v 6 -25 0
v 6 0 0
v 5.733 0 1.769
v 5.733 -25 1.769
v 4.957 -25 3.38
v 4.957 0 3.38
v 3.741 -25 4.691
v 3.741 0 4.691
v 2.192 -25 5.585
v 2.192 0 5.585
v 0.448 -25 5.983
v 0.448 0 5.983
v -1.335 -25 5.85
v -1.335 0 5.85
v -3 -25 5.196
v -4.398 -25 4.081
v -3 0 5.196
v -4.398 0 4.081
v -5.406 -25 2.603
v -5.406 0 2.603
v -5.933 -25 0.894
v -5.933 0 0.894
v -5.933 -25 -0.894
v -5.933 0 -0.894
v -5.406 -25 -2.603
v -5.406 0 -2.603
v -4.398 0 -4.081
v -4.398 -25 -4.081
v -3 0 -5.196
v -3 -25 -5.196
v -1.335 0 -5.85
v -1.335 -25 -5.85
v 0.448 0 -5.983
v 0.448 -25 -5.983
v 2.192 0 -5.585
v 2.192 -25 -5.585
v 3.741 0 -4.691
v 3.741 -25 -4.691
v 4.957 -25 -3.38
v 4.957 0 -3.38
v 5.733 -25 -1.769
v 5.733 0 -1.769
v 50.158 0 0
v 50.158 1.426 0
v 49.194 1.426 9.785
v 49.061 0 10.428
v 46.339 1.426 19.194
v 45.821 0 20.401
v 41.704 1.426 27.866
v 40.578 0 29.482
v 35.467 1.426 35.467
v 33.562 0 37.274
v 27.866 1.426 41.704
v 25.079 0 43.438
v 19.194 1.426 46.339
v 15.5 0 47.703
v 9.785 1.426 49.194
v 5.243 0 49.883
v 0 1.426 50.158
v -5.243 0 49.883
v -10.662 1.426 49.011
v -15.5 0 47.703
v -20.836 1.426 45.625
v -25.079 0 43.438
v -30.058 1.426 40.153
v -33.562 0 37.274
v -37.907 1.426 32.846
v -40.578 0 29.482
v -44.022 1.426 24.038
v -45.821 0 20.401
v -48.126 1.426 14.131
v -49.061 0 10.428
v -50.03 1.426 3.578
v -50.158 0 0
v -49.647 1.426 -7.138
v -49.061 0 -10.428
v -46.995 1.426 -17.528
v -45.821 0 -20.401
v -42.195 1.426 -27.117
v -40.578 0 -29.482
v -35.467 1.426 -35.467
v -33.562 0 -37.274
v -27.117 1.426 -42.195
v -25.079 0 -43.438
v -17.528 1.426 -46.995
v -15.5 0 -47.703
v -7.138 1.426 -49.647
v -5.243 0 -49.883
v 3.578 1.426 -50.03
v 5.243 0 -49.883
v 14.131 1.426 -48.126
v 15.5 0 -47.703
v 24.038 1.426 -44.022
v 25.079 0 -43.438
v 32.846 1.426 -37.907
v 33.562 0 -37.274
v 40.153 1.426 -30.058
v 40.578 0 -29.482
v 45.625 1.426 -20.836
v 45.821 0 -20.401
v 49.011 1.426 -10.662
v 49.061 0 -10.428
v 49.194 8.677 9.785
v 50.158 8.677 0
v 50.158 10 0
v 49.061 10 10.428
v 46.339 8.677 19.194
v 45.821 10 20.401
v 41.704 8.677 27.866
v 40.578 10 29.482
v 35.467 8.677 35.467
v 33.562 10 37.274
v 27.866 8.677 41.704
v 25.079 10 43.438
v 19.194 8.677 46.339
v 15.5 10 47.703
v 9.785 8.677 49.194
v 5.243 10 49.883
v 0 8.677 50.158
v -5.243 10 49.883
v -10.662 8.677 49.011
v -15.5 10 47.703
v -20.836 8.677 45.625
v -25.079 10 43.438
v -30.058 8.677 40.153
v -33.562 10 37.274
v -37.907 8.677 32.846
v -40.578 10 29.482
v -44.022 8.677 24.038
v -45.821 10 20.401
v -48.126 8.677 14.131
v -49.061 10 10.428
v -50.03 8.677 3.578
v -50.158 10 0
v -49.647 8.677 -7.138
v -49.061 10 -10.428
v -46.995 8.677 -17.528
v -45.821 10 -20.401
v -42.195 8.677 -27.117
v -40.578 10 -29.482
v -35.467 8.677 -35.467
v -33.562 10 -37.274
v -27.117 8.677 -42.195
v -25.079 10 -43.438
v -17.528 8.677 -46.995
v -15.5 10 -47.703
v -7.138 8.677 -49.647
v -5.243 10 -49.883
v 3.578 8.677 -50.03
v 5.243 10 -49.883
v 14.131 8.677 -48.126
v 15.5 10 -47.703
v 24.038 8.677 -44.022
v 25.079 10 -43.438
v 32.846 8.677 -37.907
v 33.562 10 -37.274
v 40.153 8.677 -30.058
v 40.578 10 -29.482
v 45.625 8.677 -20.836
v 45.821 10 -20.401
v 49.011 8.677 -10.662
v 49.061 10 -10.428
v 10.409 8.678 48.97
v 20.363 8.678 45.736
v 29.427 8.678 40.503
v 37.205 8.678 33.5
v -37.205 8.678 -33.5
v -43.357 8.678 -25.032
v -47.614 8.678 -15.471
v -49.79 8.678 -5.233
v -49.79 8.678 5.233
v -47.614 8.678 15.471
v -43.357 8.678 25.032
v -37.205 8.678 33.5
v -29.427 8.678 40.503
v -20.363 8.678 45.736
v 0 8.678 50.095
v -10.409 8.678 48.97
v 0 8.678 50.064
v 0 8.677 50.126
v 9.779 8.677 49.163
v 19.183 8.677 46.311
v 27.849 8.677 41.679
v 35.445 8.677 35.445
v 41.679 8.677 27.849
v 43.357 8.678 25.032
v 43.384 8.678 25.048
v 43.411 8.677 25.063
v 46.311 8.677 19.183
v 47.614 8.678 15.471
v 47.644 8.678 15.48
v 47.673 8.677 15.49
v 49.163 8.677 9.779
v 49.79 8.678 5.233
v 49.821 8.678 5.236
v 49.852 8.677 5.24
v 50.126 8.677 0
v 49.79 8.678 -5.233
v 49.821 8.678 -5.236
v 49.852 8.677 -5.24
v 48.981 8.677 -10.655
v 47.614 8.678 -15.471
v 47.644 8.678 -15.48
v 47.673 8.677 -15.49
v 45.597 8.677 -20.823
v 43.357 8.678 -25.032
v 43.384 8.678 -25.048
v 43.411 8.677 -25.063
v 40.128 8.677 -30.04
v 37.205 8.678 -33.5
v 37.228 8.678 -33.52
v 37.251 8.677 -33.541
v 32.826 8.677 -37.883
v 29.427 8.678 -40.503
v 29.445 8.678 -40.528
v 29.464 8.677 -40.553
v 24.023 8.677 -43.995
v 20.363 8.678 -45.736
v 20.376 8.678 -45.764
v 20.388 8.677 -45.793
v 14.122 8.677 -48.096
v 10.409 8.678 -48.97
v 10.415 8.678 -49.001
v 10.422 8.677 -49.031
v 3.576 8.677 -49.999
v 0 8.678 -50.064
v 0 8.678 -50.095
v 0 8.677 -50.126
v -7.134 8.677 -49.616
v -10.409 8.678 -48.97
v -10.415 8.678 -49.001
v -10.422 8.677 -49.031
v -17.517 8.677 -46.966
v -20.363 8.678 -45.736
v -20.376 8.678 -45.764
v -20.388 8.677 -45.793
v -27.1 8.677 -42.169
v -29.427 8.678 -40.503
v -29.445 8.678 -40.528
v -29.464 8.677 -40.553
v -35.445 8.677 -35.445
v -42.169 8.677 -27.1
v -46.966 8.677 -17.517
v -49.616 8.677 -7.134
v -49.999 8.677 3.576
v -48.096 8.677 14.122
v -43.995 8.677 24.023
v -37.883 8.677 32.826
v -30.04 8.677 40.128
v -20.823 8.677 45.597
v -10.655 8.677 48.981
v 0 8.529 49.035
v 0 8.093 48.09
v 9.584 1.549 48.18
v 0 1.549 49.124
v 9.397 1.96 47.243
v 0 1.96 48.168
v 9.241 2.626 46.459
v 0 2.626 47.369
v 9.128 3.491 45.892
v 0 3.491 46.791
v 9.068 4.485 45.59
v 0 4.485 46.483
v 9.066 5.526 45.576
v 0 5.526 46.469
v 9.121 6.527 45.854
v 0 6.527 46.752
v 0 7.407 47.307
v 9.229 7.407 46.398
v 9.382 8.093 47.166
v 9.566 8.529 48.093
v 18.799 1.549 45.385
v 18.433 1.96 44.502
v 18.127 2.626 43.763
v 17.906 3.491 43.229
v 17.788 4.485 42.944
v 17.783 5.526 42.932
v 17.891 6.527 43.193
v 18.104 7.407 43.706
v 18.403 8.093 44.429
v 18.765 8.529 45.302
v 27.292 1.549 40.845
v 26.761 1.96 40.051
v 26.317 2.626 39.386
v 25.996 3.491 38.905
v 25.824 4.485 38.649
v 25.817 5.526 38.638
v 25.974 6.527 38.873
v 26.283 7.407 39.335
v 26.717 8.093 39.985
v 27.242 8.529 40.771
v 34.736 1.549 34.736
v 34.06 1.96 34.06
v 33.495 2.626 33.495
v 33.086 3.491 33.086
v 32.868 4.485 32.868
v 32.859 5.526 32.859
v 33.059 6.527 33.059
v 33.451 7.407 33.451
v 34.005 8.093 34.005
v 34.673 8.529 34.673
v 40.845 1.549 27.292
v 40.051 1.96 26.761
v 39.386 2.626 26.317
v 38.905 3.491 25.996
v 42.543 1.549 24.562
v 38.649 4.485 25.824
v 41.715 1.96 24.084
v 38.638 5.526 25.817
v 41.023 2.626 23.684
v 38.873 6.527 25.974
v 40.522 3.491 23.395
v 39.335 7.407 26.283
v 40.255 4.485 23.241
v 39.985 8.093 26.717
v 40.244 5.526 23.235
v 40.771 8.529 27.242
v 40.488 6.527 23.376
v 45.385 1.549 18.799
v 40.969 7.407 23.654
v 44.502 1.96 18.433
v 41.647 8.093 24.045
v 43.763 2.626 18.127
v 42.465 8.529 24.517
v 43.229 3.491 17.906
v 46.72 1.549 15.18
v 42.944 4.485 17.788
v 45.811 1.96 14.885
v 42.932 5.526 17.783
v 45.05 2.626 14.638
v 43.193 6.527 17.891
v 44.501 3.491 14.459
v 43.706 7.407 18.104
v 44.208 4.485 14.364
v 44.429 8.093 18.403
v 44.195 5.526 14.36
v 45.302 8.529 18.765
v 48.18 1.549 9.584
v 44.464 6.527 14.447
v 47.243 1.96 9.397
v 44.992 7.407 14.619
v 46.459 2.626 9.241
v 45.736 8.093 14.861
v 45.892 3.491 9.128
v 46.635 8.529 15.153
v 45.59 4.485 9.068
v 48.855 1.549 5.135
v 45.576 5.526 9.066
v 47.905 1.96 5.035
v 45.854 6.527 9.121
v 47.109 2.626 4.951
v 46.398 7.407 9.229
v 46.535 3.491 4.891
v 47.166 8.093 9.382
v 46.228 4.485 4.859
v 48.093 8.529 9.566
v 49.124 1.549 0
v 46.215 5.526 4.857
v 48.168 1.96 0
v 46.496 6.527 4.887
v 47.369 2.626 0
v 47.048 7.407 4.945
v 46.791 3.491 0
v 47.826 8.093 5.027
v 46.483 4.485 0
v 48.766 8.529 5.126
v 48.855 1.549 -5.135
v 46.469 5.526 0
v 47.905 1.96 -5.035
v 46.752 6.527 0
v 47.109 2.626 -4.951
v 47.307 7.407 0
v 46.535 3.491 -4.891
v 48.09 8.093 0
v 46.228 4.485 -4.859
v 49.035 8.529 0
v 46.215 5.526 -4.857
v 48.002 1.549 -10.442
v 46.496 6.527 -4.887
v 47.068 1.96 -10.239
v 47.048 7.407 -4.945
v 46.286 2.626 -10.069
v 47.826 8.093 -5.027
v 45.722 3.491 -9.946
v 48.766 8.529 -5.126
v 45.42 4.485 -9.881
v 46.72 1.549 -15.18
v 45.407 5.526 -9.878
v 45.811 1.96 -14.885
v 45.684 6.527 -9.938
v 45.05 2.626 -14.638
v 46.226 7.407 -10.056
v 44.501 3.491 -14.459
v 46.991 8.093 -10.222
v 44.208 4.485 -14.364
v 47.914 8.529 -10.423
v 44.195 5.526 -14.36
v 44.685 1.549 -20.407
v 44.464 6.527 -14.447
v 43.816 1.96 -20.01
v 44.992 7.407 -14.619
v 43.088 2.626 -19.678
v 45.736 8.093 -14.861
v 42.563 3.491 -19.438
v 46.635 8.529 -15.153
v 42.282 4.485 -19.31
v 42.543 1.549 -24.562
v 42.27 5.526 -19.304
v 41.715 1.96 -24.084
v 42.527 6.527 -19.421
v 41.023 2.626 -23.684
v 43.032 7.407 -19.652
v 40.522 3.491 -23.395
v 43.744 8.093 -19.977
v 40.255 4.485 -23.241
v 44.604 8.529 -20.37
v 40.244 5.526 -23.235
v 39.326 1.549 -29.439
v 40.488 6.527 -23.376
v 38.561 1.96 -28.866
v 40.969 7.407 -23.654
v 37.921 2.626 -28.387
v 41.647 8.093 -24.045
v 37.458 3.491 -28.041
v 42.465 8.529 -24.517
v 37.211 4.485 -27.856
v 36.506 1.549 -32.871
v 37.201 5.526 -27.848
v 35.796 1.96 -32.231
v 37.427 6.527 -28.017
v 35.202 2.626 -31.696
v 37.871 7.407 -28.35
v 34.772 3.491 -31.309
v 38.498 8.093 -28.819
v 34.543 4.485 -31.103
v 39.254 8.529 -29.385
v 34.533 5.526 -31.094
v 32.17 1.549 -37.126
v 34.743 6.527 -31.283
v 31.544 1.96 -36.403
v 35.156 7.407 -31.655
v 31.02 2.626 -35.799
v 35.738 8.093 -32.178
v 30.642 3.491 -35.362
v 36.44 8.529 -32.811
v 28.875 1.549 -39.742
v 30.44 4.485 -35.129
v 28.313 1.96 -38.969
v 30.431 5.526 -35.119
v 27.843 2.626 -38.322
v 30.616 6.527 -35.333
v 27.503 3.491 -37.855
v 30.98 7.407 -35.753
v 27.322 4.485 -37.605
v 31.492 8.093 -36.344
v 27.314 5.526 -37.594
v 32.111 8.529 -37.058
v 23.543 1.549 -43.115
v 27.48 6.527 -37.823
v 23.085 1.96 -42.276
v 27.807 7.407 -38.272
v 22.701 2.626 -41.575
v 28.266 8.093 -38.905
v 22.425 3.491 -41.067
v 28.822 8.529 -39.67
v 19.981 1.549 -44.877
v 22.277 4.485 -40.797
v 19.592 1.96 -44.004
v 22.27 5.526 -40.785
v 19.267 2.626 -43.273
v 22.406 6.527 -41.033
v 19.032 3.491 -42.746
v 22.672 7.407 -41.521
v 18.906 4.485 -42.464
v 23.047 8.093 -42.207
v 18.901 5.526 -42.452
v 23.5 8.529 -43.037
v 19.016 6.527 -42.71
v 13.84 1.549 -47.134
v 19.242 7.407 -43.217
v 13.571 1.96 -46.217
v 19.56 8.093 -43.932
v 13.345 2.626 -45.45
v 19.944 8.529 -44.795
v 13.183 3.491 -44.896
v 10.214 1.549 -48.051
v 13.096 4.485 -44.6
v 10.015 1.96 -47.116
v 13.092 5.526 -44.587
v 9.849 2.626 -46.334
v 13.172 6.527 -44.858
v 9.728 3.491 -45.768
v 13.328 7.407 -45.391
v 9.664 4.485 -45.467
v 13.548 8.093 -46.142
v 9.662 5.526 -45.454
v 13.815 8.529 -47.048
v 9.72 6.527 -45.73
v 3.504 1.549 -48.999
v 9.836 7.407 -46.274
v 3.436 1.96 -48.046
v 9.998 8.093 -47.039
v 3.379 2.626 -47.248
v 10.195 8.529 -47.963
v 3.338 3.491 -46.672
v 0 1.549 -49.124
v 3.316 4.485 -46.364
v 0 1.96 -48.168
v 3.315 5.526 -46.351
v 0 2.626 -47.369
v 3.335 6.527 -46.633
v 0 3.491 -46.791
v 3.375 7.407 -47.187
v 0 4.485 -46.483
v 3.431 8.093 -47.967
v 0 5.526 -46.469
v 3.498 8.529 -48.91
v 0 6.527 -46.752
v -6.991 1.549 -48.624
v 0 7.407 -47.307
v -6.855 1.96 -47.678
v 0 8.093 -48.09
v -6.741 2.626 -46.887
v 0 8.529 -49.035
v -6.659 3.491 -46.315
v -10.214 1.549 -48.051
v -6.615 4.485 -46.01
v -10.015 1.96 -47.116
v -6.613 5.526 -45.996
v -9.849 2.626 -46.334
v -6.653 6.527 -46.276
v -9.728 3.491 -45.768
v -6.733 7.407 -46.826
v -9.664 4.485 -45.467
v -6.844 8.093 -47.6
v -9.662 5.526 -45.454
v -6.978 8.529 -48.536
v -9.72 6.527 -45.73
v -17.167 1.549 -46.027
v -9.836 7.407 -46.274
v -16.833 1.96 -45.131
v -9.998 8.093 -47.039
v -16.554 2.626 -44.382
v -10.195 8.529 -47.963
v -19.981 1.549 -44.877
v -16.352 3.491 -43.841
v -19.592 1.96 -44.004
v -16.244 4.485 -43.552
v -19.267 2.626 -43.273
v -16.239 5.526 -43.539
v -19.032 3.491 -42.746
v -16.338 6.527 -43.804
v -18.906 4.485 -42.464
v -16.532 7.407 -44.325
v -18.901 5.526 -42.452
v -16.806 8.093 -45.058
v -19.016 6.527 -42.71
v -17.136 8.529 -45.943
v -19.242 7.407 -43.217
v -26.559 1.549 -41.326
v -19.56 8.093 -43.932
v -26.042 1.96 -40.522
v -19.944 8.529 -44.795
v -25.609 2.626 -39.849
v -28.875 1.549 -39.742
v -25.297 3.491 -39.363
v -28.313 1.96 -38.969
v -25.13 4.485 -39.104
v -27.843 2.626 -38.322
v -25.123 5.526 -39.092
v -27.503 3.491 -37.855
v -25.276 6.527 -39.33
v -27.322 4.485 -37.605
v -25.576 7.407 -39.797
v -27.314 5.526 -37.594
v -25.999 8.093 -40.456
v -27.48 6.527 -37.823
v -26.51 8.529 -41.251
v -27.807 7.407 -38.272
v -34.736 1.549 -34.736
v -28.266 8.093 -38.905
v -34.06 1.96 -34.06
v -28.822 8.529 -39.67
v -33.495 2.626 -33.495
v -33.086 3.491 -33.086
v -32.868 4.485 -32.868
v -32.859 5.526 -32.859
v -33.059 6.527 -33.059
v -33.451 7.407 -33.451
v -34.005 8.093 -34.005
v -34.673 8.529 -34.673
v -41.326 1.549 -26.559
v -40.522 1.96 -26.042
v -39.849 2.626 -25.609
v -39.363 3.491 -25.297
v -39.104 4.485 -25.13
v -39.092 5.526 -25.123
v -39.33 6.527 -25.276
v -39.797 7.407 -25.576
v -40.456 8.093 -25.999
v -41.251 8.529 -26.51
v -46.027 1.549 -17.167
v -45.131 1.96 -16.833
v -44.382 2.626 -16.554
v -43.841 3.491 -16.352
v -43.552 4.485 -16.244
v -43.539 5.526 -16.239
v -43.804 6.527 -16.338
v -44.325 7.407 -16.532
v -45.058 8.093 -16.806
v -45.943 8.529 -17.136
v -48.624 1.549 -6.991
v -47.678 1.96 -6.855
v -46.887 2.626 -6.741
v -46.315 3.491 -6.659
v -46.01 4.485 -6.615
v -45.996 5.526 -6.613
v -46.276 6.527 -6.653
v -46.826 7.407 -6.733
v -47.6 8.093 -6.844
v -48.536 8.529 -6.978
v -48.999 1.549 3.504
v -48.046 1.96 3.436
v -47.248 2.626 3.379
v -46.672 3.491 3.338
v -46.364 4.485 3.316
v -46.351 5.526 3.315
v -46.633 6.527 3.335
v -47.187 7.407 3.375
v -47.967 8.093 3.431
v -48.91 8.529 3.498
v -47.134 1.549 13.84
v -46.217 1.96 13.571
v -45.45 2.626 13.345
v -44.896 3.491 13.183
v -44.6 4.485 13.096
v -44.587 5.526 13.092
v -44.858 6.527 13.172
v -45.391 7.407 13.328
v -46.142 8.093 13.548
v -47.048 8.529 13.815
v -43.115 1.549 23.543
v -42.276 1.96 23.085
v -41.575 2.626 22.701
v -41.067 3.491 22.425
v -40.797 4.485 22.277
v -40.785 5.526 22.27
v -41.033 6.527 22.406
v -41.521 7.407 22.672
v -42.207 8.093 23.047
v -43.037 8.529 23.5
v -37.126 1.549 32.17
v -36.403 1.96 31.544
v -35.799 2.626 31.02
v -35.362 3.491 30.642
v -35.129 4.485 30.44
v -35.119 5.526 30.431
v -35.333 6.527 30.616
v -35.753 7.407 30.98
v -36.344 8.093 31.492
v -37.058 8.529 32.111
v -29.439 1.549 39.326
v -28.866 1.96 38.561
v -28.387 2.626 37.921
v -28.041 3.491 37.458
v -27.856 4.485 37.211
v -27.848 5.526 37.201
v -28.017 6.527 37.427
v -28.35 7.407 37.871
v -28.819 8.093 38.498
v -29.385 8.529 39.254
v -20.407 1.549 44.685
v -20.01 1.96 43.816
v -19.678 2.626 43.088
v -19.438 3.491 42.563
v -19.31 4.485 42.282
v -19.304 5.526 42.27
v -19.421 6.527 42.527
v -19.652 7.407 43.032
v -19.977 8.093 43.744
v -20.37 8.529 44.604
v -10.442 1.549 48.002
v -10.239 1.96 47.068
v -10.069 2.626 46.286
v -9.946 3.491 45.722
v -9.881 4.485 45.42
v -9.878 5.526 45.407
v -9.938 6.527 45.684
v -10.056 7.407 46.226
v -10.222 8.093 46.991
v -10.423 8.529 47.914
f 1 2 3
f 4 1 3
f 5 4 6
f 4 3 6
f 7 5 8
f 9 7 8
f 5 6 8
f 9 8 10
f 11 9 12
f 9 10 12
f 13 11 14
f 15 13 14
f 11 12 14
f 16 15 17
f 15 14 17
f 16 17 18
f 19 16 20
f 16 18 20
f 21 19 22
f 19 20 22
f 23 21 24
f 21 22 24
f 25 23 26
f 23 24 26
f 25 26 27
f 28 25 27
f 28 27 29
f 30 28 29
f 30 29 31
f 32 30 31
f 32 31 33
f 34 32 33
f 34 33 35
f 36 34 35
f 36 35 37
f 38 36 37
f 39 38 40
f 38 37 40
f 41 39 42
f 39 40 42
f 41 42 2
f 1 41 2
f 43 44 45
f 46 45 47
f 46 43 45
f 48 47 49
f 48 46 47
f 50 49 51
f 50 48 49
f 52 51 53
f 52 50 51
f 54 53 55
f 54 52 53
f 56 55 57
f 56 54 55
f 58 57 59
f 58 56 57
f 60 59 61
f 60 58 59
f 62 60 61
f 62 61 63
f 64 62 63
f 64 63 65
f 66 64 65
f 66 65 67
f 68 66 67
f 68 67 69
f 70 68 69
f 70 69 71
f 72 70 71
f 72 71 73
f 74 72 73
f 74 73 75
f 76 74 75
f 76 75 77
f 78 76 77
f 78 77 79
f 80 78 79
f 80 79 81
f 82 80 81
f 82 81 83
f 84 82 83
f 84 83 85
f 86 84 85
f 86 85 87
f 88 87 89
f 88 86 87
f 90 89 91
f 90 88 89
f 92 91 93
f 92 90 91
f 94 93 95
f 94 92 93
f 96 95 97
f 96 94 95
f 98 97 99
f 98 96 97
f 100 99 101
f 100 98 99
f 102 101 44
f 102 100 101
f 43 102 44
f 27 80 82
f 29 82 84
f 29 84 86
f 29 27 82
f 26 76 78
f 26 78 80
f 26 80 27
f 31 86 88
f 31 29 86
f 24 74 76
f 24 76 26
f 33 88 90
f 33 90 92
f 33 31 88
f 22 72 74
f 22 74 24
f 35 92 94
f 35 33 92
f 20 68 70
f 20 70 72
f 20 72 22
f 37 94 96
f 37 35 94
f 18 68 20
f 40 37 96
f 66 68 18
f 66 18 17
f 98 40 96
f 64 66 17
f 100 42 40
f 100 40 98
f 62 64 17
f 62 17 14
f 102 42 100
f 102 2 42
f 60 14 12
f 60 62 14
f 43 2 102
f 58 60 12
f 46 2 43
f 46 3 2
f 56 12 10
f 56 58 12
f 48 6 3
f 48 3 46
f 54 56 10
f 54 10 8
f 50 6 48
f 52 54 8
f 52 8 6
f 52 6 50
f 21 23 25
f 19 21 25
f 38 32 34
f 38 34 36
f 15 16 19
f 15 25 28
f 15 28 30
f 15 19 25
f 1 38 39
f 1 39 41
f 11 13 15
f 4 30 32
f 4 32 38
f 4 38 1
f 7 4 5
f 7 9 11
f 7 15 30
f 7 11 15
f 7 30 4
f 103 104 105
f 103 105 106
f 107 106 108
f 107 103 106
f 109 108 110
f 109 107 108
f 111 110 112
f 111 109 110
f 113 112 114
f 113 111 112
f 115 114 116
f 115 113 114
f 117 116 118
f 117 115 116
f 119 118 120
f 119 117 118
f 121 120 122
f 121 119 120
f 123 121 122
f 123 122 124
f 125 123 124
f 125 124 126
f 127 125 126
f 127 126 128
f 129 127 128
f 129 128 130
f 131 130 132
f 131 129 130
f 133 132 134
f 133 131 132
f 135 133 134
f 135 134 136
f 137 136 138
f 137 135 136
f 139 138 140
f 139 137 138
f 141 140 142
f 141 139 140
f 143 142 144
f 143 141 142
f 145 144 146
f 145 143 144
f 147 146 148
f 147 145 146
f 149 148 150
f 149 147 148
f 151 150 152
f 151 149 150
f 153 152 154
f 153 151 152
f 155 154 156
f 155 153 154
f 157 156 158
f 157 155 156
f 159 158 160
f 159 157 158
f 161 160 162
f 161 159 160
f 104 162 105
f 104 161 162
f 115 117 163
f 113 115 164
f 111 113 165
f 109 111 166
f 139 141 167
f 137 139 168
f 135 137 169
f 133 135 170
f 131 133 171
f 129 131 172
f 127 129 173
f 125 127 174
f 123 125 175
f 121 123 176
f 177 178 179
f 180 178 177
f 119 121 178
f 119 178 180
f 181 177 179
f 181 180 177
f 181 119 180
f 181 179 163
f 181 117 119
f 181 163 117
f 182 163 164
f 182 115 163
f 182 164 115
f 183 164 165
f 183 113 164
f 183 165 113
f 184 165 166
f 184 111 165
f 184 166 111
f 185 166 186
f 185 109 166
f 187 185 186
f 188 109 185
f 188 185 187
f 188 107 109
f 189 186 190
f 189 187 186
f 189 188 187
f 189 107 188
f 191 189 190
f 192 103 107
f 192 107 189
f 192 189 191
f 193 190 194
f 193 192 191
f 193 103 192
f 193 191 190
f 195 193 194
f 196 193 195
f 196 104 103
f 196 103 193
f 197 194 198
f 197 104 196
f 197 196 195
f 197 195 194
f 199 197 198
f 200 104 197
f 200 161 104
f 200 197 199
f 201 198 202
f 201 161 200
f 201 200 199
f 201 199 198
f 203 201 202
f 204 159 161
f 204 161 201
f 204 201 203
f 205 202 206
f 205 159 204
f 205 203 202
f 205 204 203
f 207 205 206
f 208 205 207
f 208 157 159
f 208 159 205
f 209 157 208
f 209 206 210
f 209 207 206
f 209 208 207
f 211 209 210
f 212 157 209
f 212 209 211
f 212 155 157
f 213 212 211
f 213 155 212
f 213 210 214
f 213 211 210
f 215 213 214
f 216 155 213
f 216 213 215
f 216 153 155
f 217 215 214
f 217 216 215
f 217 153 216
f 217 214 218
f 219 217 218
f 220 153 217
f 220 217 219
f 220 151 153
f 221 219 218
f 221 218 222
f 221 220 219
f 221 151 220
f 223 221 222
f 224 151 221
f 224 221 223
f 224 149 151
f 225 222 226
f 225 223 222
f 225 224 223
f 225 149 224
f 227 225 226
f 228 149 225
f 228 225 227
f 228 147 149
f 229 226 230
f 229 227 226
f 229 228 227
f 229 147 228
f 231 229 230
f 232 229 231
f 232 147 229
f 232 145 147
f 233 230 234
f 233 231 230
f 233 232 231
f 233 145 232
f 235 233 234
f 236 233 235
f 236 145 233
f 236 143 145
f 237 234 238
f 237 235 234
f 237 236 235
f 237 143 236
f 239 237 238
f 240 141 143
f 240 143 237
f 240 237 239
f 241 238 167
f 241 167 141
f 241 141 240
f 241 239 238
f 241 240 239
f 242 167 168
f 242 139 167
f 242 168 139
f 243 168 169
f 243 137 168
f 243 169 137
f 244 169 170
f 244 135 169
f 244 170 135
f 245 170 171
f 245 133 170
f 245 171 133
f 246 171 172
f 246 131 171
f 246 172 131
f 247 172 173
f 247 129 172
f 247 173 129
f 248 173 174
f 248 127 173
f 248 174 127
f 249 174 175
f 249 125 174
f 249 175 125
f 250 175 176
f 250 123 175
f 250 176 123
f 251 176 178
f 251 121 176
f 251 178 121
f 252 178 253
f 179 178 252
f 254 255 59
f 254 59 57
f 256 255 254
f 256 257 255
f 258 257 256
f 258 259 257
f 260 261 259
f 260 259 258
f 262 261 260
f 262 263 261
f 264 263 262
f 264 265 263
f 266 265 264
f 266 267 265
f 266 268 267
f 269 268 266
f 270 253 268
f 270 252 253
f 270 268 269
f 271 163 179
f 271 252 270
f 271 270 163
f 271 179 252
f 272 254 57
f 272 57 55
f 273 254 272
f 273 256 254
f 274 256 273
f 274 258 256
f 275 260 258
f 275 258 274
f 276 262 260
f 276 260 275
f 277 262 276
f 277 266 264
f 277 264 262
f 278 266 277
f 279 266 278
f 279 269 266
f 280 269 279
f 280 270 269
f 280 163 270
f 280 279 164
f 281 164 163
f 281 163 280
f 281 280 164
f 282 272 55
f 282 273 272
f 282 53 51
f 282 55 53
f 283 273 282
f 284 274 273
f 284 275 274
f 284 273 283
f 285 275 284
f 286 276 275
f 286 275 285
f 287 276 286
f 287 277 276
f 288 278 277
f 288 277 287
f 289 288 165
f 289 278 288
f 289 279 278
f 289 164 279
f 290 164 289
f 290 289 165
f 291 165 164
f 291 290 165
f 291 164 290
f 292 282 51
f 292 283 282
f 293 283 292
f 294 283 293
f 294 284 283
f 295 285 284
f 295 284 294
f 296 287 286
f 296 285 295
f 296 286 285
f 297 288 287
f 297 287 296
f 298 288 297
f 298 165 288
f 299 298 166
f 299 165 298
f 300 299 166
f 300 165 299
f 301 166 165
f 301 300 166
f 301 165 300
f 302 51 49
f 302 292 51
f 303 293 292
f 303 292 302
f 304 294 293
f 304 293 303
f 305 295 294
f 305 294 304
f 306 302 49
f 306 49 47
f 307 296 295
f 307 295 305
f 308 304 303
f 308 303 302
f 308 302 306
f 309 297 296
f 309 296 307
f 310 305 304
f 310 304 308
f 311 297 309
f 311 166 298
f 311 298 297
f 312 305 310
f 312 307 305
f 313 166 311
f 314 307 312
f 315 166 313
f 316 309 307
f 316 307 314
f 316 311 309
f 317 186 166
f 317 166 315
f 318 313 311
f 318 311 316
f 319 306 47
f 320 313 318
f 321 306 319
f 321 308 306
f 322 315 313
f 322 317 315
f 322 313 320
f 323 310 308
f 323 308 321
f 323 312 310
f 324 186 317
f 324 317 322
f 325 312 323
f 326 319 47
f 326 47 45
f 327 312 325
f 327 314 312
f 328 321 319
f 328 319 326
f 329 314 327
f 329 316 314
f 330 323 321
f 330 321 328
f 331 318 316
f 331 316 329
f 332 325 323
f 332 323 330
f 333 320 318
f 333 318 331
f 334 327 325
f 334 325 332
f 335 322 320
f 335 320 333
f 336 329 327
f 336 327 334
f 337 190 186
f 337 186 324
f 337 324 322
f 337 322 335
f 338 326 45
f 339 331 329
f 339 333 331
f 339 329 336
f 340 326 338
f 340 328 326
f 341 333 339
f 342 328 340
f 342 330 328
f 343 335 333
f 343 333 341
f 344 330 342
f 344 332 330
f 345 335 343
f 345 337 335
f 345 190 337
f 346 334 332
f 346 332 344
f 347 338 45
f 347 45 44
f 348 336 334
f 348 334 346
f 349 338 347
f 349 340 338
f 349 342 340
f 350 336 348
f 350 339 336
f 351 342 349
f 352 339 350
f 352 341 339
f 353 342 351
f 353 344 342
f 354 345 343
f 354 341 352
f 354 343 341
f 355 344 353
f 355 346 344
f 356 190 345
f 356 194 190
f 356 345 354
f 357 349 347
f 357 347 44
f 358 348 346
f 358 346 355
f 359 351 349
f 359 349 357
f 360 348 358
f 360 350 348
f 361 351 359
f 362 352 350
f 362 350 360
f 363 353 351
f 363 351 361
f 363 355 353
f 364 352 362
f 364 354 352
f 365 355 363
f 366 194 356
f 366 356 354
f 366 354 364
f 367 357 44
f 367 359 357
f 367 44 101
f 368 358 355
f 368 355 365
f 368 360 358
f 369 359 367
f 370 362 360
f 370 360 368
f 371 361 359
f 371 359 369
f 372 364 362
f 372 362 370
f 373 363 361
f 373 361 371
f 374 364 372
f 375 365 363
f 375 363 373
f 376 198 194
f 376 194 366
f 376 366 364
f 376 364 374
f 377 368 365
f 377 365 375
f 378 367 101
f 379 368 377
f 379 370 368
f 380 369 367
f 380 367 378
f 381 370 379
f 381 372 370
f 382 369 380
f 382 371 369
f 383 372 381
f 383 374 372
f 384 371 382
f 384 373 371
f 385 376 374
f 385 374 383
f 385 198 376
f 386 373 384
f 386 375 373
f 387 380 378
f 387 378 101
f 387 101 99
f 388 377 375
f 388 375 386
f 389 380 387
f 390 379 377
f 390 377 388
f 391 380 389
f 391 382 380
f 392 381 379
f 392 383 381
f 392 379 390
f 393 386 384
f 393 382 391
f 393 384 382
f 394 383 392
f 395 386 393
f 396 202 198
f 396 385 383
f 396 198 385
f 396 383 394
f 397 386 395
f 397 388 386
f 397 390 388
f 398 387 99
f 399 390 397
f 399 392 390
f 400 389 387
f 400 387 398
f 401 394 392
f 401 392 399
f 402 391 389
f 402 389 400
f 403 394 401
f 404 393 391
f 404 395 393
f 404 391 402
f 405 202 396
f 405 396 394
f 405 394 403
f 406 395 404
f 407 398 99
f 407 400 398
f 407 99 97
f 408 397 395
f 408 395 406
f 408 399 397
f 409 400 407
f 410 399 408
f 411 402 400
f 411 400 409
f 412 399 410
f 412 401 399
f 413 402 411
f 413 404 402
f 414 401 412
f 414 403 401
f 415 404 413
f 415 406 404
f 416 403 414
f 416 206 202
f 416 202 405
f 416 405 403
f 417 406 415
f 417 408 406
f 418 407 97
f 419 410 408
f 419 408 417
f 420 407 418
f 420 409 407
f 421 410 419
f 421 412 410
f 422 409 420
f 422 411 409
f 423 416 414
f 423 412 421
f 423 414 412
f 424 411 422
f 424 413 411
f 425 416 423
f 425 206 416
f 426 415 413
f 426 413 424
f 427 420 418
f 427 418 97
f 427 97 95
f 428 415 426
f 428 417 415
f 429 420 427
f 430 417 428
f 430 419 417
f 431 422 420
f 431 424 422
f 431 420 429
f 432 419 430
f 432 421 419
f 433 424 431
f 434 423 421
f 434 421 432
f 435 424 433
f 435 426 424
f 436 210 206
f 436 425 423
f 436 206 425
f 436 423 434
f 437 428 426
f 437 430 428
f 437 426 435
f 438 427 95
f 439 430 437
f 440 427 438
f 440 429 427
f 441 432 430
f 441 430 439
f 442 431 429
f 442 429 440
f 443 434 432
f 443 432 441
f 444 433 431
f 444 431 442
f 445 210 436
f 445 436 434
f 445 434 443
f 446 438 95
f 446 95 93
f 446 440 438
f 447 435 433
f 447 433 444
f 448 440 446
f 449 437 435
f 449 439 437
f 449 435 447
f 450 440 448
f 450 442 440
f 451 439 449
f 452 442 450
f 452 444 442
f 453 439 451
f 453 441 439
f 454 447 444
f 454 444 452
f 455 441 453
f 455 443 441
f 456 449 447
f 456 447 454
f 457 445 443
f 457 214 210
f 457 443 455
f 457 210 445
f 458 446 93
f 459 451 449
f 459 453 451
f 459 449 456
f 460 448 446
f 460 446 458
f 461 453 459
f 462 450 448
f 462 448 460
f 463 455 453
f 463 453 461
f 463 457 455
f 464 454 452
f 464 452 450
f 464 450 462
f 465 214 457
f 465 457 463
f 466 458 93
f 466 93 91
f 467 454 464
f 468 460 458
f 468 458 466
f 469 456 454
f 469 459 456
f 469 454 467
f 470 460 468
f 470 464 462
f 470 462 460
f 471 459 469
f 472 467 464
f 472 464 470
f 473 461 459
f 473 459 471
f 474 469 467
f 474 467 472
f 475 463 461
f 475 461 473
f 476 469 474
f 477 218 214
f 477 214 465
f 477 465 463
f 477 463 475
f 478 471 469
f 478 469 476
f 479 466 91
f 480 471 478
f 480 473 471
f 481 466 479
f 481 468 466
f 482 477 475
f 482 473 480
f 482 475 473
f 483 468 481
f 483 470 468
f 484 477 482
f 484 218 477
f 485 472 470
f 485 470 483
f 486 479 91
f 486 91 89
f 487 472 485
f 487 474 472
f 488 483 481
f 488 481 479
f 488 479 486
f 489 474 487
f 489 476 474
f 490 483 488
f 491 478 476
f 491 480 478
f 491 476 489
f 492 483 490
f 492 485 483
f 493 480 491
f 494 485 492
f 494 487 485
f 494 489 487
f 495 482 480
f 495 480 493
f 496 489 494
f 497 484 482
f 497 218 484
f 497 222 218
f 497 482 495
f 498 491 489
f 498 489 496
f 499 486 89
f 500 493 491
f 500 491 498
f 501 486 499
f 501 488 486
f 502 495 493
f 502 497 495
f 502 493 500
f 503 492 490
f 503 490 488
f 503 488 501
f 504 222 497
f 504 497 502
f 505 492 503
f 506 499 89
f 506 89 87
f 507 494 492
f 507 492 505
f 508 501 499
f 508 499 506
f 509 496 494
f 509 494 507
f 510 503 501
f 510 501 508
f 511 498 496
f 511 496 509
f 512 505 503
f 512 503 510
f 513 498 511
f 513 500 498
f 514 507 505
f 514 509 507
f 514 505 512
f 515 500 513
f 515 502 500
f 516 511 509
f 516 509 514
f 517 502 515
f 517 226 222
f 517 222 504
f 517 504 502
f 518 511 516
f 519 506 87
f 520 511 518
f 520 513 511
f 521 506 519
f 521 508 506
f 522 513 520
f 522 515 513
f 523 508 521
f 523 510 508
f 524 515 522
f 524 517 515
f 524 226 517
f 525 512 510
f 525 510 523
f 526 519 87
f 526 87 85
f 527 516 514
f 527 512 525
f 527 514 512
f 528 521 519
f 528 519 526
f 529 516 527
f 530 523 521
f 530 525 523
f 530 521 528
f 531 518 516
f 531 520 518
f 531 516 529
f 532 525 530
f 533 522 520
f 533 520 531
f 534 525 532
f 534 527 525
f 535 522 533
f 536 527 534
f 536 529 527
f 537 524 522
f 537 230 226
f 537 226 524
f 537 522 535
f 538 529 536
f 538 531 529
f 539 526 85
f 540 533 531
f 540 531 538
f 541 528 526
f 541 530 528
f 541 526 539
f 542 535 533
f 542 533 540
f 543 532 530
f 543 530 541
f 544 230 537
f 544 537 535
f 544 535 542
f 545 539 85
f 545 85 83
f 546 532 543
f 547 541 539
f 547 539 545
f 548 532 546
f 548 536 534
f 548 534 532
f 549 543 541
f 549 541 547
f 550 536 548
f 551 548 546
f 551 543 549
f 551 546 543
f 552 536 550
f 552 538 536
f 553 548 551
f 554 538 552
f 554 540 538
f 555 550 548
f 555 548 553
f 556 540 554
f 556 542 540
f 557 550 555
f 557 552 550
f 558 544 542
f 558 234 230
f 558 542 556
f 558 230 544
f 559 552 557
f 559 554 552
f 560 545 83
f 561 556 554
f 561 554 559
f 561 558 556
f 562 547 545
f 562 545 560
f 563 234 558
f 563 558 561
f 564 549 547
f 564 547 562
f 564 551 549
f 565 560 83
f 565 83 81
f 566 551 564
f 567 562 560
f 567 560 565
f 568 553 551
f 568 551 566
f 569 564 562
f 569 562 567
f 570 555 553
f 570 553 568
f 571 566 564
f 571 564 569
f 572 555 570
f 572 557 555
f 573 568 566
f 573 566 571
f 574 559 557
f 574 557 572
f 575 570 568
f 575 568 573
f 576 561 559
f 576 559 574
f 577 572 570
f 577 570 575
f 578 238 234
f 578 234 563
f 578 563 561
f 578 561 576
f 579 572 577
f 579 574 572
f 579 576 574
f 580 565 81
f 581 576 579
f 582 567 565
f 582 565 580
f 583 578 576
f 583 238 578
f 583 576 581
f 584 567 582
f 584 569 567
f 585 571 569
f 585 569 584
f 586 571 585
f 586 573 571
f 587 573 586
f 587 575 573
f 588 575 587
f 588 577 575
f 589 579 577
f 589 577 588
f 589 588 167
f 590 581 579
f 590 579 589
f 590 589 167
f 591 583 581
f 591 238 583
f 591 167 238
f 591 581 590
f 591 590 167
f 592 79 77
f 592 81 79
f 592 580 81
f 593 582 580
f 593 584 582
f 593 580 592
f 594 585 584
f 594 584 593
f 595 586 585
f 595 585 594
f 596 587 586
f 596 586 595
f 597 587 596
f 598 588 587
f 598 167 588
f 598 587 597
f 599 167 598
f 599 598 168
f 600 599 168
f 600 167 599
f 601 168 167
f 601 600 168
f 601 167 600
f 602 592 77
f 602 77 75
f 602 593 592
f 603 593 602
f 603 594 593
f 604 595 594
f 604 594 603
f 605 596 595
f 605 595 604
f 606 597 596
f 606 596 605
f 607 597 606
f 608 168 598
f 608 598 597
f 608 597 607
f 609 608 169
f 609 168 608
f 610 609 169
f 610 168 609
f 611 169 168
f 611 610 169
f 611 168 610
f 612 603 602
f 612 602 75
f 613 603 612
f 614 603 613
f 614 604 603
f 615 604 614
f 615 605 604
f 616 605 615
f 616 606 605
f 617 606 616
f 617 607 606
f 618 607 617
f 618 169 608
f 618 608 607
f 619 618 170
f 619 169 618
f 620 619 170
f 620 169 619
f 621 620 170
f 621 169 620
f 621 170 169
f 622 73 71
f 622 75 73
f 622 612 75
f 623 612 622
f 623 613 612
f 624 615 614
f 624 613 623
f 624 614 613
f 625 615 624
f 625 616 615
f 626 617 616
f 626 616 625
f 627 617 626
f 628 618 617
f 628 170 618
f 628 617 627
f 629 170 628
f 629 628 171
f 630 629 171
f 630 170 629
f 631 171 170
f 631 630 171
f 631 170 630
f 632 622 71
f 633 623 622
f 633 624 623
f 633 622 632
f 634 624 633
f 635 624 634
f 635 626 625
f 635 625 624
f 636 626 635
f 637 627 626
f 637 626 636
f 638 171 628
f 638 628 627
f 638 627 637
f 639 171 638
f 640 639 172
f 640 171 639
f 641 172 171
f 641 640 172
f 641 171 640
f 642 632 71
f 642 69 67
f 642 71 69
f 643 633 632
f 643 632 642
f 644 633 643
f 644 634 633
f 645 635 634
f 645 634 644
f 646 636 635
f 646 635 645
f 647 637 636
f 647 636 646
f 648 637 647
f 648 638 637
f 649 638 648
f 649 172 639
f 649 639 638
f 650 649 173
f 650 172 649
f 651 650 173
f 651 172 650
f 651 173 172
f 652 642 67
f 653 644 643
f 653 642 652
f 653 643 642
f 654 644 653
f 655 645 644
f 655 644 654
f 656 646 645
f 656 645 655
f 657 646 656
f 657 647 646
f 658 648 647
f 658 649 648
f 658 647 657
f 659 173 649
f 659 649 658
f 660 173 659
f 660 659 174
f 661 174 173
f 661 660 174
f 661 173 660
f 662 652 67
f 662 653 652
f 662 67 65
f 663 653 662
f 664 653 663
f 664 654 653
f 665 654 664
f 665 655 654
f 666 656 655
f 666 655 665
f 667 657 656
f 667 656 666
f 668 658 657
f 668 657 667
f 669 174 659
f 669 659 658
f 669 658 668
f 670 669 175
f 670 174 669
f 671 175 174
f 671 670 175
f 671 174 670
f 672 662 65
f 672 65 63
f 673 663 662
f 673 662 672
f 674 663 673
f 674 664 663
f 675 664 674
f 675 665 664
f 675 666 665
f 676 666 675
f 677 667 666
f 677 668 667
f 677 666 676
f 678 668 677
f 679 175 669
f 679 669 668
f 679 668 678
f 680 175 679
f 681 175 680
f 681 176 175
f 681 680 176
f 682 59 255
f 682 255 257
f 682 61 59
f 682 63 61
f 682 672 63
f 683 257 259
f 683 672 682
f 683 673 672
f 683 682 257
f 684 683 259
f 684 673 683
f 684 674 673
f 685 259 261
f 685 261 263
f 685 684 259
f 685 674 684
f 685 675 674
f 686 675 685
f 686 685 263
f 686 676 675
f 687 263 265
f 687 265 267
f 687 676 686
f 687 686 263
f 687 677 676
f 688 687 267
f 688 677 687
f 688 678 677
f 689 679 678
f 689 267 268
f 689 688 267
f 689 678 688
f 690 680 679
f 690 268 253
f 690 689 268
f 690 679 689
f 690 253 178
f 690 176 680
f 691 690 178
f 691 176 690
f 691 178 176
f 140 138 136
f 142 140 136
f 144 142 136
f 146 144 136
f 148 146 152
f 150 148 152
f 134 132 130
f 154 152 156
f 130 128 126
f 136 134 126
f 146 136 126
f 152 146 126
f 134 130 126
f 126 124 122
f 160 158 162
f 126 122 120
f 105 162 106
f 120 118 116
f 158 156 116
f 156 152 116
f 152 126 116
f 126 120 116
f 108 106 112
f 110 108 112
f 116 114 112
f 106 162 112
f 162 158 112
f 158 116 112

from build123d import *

# Parameters (mm, degrees)
F0_R     = 50.157501
F1_DEPTH = 10
F2_R     = 3.626246
F4_R     = 6
F5_DEPTH = 25
F6_R     = 3.797047
F7_DEPTH = 100


with BuildPart() as f1:
    # F0 (on Front) → F1 (new body)
    with BuildSketch(Plane.XZ):
        Circle(F0_R)
    extrude(amount=-F1_DEPTH)

    # F2 (on Right) → F3 (revolve, cut)
    with BuildSketch(Plane.YZ):
        with Locations((5.051546, 50.064437)):
            Circle(F2_R)
    revolve(axis=Axis((0, -2.255155, 0), (0, 1, 0)), mode=Mode.SUBTRACT)

    # F4 (on face) → F5 (join)
    with BuildSketch(Plane.XZ):
        Circle(F4_R)
    extrude(amount=F5_DEPTH)


with BuildPart() as f7:
    # F6 (on Right) → F7 (new body, symmetric)
    with BuildSketch(Plane.YZ):
        with Locations((0, 74.842192)):
            Circle(F6_R)
    extrude(amount=F7_DEPTH, both=True)


solid = f1.part
